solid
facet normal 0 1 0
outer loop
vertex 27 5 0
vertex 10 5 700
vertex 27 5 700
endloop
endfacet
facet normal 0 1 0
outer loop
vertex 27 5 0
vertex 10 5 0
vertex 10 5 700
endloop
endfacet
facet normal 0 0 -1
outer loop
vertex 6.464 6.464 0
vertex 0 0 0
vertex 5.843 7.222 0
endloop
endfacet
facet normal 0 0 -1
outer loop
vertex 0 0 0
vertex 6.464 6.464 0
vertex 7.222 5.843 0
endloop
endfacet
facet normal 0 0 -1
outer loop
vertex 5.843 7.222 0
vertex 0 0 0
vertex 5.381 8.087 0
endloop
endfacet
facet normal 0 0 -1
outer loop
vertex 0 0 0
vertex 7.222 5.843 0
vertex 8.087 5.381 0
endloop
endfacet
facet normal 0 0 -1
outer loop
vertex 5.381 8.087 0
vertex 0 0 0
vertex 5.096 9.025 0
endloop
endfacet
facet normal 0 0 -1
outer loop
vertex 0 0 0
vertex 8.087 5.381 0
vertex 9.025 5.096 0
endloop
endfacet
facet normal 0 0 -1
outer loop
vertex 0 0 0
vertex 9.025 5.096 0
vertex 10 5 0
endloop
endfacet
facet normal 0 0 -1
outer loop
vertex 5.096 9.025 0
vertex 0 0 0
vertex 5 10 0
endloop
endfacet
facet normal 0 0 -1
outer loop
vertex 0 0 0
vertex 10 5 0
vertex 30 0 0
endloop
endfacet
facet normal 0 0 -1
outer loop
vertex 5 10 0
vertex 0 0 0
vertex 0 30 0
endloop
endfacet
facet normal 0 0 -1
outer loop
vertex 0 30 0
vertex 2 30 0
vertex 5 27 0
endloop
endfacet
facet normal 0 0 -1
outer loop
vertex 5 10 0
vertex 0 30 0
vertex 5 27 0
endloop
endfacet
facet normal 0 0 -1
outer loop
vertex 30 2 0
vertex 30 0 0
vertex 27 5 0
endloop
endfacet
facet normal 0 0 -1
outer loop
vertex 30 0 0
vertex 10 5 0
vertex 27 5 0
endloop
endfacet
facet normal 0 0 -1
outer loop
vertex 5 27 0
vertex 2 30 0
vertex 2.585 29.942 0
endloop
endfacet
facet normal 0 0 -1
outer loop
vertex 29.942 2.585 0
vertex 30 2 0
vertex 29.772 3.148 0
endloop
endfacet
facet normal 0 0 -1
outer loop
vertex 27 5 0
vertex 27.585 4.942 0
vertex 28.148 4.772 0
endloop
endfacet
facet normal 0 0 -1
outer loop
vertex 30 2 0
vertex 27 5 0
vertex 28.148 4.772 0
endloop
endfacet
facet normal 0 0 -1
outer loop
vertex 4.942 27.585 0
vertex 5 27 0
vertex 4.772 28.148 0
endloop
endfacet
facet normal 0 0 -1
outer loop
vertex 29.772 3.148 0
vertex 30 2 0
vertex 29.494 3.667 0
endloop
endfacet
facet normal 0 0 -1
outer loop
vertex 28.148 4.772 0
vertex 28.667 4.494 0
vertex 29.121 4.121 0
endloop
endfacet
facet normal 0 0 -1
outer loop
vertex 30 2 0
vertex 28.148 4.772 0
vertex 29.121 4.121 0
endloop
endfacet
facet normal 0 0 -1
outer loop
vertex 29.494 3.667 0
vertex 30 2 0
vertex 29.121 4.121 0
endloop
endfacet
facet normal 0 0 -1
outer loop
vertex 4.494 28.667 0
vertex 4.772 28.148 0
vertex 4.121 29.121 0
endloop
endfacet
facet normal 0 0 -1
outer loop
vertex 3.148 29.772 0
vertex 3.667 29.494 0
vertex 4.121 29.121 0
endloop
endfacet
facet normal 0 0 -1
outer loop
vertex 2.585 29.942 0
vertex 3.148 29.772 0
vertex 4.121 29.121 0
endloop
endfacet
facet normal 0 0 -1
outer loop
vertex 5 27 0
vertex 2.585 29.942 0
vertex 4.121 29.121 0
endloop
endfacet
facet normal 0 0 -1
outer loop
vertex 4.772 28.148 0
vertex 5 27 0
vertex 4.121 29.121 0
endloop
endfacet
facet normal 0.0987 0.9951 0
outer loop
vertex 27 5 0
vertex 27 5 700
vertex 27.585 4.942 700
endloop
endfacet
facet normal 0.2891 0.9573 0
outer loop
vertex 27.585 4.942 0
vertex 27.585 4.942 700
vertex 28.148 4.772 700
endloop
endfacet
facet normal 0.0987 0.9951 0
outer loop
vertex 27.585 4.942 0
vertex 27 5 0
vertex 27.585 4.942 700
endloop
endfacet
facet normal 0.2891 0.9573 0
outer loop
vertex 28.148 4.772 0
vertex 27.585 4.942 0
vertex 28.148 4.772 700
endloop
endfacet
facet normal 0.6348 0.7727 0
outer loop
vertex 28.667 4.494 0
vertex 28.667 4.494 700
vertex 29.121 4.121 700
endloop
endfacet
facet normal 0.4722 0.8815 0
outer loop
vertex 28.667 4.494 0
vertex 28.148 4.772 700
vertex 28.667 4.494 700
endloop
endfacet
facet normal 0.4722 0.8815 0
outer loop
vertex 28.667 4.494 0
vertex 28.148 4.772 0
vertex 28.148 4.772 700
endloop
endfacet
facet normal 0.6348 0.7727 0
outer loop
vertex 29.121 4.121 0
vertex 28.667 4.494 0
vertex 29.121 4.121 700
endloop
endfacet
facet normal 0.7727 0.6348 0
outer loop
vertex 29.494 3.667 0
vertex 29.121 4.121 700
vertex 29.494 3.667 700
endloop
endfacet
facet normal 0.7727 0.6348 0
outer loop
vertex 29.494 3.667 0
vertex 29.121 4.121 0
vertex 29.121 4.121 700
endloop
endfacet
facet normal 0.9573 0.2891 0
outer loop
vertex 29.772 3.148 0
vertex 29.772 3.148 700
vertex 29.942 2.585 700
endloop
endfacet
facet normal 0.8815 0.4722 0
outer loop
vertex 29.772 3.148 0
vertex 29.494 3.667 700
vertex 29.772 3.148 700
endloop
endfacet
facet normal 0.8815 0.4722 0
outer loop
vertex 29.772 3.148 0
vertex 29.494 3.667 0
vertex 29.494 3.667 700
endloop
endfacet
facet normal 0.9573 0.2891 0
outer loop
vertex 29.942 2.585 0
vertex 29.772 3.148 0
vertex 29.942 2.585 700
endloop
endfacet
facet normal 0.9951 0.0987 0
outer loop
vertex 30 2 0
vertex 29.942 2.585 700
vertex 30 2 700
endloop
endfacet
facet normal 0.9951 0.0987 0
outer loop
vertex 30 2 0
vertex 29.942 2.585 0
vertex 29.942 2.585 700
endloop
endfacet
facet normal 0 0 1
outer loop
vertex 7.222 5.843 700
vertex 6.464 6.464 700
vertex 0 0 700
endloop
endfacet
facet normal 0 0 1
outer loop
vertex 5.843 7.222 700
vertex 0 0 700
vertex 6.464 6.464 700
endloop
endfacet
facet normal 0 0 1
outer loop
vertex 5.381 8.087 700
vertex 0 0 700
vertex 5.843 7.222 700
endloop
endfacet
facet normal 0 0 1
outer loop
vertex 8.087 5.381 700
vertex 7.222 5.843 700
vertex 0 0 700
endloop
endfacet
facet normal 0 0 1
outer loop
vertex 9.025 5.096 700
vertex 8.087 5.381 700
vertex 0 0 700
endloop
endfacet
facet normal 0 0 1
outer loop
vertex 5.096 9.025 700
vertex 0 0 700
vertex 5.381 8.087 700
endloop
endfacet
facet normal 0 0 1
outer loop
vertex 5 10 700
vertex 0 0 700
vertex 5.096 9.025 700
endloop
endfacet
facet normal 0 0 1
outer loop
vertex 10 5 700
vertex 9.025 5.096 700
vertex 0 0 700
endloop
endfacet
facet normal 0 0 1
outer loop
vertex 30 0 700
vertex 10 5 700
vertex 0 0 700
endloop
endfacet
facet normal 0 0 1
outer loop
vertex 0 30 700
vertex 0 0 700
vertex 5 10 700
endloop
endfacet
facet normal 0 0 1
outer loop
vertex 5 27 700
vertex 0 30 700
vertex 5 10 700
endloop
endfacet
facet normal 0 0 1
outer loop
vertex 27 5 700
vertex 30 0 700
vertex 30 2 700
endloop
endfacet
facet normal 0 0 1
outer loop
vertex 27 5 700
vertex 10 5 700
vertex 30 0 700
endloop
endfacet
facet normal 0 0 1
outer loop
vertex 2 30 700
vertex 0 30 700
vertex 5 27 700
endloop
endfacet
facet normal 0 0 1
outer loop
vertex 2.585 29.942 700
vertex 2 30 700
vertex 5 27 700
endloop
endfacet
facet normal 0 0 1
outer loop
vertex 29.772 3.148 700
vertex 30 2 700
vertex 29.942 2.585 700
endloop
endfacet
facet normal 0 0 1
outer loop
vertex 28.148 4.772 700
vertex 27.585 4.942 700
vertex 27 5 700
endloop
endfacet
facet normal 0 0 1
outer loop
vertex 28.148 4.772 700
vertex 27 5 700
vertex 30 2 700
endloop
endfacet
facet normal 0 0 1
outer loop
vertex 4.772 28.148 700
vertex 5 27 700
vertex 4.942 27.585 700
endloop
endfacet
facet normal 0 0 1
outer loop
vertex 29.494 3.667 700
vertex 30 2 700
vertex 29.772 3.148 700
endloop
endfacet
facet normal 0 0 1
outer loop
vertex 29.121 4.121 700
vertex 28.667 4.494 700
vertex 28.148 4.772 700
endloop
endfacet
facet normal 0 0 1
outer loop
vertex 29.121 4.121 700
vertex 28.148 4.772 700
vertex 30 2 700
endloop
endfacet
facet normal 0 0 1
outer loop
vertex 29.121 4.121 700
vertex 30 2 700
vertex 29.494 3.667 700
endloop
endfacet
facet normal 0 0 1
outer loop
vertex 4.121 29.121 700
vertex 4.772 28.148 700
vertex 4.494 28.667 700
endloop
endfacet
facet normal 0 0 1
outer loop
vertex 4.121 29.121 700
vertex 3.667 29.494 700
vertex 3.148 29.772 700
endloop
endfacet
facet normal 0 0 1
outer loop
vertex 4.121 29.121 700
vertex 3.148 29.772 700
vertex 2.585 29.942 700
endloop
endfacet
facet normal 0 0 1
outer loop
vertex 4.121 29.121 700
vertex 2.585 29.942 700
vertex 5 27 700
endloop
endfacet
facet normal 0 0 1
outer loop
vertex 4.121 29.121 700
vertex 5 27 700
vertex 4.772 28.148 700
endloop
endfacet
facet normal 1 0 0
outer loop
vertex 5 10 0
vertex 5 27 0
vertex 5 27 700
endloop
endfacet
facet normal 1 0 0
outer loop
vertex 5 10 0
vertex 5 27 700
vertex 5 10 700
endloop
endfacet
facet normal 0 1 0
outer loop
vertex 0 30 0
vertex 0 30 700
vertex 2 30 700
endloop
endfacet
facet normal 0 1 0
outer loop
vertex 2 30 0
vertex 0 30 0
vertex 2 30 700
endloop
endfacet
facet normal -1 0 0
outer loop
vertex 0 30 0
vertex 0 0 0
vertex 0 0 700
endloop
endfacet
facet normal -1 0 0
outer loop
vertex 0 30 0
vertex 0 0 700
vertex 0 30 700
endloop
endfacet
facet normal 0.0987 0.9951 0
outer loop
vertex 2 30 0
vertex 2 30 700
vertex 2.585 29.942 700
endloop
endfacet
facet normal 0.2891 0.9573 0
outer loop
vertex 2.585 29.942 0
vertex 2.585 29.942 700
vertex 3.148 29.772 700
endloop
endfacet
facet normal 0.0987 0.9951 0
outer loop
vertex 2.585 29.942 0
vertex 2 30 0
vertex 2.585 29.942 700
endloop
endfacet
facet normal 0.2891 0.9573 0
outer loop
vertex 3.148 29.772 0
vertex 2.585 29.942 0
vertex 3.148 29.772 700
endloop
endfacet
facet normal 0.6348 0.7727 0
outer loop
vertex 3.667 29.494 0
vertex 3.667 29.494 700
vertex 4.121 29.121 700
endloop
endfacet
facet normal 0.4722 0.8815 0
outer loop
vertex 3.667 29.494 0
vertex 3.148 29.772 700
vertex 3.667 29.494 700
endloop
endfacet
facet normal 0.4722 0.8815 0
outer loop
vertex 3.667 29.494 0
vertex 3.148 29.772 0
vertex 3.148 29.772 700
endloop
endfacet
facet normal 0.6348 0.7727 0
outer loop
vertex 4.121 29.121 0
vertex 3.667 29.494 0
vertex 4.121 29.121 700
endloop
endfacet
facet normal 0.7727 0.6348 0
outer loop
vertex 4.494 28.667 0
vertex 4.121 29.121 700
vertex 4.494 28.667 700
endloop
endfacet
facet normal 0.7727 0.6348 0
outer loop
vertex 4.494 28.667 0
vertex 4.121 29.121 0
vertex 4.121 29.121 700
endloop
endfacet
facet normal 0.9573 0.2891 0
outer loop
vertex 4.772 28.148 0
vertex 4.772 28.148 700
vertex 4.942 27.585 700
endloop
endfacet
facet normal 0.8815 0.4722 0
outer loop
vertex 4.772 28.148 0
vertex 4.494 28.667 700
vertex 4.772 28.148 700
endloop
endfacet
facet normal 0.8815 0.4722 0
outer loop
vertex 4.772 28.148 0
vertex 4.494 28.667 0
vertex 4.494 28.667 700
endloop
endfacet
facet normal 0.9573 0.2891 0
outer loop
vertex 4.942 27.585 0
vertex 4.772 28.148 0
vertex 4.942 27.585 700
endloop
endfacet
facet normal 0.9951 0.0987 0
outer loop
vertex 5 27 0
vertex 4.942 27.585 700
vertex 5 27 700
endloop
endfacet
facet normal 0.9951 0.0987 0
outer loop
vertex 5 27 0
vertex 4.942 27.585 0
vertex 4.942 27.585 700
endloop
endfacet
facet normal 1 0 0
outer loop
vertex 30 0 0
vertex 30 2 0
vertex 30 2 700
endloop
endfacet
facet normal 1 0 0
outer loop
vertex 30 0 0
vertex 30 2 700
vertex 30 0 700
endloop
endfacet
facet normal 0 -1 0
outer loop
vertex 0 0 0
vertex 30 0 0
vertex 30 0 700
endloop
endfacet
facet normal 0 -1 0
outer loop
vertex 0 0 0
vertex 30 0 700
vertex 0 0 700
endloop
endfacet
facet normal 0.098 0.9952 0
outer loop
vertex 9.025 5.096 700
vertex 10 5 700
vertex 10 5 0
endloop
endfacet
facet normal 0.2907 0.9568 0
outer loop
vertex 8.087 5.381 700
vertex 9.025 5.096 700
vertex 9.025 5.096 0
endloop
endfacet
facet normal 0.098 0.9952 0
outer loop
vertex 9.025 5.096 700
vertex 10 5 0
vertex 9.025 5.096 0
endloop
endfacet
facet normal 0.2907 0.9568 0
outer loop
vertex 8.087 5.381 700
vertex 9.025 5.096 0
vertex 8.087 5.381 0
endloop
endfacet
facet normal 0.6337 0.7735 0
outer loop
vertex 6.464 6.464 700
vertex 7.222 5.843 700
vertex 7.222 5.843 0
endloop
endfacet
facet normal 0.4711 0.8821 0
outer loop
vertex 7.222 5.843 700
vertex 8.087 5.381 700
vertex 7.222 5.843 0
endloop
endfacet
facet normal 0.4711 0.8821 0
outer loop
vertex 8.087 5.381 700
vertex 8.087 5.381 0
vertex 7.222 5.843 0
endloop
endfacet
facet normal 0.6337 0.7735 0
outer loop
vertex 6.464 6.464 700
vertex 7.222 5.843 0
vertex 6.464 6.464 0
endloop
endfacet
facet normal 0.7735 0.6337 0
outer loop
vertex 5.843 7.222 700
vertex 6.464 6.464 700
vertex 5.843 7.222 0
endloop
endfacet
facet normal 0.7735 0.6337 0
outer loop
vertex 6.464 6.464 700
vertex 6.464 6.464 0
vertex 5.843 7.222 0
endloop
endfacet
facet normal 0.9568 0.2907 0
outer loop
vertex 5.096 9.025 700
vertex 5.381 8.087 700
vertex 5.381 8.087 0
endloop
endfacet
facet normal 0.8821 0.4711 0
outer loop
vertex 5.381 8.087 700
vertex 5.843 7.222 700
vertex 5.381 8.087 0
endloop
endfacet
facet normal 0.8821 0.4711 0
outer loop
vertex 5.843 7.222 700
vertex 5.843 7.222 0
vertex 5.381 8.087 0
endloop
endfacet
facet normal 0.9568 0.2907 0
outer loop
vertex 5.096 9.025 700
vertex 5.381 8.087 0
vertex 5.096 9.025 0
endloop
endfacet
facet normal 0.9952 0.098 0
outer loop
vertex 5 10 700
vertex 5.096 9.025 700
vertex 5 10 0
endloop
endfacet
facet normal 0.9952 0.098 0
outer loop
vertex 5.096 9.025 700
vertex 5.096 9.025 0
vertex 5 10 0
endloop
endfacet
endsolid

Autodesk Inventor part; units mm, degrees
ref_plane "YZ Plane" through (0, 0, 0) normal (1, 0, 0) x (0, 1, 0)
ref_plane "Plano inicial" through (0, 0, 0) normal (0, 0, 1) x (1, 0, 0)
ref_plane "Plano final" through (0, 0, 700) normal (0, 0, 1) x (1, 0, 0)
sketch "Rascunho" plane through (0, 0, 0) normal (0, 0, 1) x (1, 0, 0)
  line L0 (30, 0) -> (0, 0)
  line L1 (0, 0) -> (0, 30)
  line L2 (0, 30) -> (2, 30)
  line L3 (5, 27) -> (5, 10)
  line L4 (10, 5) -> (27, 5)
  line L5 (30, 2) -> (30, 0)
  line L6 (0, -11.0414) -> (0, 31.5385) construction
  line L7 (-11.0414, 0) -> (31.5385, 0) construction
  arc A0 (5, 10) -> (10, 5) centre (10, 10) ccw
  arc A1 (5, 27) -> (2, 30) centre (2, 27) ccw
  arc A2 (30, 2) -> (27, 5) centre (27, 2) ccw
  line L8 (0, 62.9539) -> (0, -23.374) construction
  line L9 (-23.374, 0) -> (62.9539, 0) construction
  point P0 (5, 30)
  point P1 (5, 5)
  point P2 (30, 5)
  dimension "d0" = 30
  dimension "d1" = 30
  dimension "d2" = 5
  dimension "d3" = 5
  dimension "d8" = 5
  dimension "d9" = 3
  dimension "d10" = 0
  dimension "d11" = 0
extrude "Corpo" add sketch "Rascunho" along normal up to surface (700 mm away) from surface at 0
sketch "Sketch3" plane through (0, 0, 0) normal (0, 0, 1) x (1, 0, 0)
  line L0 (0, 0) -> (10, 0)
ref_plane "Work Plane3" through (0, 0, 0) normal (0, -1, 0) x (1, 0, 0)
sketch "Sketch4" plane through (0, 0, 0) normal (0, -1, 0) x (1, 0, 0)
  line L0 (-2, 0) -> (12, 0) projected
  line L1 (-2, 700) -> (12, 700) projected
  dimension "d15" = 700
equation "\"d0\" = G_H"
equation "\"d1\" = G_H"
equation "\"d2\" = G_T"
equation "\"d3\" = G_T"
equation "\"d8\" = G_IR"
equation "\"d9\" = G_ER"
equation "\"d4\" = G_L"
equation "\"G_H\" = 30"
equation "\"G_T\" = 5"
equation "\"G_ER\" = 3"
equation "\"G_IR\" = 5"
equation "\"G_L\" = d15"
equation "\"ex\" = 0"
equation "\"G_OFFSET_START\" = 0"
equation "\"G_OFFSET_END\" = 0"
properties part number "IS 808 - ISA 3030 - 700" material "Aço, suave"
